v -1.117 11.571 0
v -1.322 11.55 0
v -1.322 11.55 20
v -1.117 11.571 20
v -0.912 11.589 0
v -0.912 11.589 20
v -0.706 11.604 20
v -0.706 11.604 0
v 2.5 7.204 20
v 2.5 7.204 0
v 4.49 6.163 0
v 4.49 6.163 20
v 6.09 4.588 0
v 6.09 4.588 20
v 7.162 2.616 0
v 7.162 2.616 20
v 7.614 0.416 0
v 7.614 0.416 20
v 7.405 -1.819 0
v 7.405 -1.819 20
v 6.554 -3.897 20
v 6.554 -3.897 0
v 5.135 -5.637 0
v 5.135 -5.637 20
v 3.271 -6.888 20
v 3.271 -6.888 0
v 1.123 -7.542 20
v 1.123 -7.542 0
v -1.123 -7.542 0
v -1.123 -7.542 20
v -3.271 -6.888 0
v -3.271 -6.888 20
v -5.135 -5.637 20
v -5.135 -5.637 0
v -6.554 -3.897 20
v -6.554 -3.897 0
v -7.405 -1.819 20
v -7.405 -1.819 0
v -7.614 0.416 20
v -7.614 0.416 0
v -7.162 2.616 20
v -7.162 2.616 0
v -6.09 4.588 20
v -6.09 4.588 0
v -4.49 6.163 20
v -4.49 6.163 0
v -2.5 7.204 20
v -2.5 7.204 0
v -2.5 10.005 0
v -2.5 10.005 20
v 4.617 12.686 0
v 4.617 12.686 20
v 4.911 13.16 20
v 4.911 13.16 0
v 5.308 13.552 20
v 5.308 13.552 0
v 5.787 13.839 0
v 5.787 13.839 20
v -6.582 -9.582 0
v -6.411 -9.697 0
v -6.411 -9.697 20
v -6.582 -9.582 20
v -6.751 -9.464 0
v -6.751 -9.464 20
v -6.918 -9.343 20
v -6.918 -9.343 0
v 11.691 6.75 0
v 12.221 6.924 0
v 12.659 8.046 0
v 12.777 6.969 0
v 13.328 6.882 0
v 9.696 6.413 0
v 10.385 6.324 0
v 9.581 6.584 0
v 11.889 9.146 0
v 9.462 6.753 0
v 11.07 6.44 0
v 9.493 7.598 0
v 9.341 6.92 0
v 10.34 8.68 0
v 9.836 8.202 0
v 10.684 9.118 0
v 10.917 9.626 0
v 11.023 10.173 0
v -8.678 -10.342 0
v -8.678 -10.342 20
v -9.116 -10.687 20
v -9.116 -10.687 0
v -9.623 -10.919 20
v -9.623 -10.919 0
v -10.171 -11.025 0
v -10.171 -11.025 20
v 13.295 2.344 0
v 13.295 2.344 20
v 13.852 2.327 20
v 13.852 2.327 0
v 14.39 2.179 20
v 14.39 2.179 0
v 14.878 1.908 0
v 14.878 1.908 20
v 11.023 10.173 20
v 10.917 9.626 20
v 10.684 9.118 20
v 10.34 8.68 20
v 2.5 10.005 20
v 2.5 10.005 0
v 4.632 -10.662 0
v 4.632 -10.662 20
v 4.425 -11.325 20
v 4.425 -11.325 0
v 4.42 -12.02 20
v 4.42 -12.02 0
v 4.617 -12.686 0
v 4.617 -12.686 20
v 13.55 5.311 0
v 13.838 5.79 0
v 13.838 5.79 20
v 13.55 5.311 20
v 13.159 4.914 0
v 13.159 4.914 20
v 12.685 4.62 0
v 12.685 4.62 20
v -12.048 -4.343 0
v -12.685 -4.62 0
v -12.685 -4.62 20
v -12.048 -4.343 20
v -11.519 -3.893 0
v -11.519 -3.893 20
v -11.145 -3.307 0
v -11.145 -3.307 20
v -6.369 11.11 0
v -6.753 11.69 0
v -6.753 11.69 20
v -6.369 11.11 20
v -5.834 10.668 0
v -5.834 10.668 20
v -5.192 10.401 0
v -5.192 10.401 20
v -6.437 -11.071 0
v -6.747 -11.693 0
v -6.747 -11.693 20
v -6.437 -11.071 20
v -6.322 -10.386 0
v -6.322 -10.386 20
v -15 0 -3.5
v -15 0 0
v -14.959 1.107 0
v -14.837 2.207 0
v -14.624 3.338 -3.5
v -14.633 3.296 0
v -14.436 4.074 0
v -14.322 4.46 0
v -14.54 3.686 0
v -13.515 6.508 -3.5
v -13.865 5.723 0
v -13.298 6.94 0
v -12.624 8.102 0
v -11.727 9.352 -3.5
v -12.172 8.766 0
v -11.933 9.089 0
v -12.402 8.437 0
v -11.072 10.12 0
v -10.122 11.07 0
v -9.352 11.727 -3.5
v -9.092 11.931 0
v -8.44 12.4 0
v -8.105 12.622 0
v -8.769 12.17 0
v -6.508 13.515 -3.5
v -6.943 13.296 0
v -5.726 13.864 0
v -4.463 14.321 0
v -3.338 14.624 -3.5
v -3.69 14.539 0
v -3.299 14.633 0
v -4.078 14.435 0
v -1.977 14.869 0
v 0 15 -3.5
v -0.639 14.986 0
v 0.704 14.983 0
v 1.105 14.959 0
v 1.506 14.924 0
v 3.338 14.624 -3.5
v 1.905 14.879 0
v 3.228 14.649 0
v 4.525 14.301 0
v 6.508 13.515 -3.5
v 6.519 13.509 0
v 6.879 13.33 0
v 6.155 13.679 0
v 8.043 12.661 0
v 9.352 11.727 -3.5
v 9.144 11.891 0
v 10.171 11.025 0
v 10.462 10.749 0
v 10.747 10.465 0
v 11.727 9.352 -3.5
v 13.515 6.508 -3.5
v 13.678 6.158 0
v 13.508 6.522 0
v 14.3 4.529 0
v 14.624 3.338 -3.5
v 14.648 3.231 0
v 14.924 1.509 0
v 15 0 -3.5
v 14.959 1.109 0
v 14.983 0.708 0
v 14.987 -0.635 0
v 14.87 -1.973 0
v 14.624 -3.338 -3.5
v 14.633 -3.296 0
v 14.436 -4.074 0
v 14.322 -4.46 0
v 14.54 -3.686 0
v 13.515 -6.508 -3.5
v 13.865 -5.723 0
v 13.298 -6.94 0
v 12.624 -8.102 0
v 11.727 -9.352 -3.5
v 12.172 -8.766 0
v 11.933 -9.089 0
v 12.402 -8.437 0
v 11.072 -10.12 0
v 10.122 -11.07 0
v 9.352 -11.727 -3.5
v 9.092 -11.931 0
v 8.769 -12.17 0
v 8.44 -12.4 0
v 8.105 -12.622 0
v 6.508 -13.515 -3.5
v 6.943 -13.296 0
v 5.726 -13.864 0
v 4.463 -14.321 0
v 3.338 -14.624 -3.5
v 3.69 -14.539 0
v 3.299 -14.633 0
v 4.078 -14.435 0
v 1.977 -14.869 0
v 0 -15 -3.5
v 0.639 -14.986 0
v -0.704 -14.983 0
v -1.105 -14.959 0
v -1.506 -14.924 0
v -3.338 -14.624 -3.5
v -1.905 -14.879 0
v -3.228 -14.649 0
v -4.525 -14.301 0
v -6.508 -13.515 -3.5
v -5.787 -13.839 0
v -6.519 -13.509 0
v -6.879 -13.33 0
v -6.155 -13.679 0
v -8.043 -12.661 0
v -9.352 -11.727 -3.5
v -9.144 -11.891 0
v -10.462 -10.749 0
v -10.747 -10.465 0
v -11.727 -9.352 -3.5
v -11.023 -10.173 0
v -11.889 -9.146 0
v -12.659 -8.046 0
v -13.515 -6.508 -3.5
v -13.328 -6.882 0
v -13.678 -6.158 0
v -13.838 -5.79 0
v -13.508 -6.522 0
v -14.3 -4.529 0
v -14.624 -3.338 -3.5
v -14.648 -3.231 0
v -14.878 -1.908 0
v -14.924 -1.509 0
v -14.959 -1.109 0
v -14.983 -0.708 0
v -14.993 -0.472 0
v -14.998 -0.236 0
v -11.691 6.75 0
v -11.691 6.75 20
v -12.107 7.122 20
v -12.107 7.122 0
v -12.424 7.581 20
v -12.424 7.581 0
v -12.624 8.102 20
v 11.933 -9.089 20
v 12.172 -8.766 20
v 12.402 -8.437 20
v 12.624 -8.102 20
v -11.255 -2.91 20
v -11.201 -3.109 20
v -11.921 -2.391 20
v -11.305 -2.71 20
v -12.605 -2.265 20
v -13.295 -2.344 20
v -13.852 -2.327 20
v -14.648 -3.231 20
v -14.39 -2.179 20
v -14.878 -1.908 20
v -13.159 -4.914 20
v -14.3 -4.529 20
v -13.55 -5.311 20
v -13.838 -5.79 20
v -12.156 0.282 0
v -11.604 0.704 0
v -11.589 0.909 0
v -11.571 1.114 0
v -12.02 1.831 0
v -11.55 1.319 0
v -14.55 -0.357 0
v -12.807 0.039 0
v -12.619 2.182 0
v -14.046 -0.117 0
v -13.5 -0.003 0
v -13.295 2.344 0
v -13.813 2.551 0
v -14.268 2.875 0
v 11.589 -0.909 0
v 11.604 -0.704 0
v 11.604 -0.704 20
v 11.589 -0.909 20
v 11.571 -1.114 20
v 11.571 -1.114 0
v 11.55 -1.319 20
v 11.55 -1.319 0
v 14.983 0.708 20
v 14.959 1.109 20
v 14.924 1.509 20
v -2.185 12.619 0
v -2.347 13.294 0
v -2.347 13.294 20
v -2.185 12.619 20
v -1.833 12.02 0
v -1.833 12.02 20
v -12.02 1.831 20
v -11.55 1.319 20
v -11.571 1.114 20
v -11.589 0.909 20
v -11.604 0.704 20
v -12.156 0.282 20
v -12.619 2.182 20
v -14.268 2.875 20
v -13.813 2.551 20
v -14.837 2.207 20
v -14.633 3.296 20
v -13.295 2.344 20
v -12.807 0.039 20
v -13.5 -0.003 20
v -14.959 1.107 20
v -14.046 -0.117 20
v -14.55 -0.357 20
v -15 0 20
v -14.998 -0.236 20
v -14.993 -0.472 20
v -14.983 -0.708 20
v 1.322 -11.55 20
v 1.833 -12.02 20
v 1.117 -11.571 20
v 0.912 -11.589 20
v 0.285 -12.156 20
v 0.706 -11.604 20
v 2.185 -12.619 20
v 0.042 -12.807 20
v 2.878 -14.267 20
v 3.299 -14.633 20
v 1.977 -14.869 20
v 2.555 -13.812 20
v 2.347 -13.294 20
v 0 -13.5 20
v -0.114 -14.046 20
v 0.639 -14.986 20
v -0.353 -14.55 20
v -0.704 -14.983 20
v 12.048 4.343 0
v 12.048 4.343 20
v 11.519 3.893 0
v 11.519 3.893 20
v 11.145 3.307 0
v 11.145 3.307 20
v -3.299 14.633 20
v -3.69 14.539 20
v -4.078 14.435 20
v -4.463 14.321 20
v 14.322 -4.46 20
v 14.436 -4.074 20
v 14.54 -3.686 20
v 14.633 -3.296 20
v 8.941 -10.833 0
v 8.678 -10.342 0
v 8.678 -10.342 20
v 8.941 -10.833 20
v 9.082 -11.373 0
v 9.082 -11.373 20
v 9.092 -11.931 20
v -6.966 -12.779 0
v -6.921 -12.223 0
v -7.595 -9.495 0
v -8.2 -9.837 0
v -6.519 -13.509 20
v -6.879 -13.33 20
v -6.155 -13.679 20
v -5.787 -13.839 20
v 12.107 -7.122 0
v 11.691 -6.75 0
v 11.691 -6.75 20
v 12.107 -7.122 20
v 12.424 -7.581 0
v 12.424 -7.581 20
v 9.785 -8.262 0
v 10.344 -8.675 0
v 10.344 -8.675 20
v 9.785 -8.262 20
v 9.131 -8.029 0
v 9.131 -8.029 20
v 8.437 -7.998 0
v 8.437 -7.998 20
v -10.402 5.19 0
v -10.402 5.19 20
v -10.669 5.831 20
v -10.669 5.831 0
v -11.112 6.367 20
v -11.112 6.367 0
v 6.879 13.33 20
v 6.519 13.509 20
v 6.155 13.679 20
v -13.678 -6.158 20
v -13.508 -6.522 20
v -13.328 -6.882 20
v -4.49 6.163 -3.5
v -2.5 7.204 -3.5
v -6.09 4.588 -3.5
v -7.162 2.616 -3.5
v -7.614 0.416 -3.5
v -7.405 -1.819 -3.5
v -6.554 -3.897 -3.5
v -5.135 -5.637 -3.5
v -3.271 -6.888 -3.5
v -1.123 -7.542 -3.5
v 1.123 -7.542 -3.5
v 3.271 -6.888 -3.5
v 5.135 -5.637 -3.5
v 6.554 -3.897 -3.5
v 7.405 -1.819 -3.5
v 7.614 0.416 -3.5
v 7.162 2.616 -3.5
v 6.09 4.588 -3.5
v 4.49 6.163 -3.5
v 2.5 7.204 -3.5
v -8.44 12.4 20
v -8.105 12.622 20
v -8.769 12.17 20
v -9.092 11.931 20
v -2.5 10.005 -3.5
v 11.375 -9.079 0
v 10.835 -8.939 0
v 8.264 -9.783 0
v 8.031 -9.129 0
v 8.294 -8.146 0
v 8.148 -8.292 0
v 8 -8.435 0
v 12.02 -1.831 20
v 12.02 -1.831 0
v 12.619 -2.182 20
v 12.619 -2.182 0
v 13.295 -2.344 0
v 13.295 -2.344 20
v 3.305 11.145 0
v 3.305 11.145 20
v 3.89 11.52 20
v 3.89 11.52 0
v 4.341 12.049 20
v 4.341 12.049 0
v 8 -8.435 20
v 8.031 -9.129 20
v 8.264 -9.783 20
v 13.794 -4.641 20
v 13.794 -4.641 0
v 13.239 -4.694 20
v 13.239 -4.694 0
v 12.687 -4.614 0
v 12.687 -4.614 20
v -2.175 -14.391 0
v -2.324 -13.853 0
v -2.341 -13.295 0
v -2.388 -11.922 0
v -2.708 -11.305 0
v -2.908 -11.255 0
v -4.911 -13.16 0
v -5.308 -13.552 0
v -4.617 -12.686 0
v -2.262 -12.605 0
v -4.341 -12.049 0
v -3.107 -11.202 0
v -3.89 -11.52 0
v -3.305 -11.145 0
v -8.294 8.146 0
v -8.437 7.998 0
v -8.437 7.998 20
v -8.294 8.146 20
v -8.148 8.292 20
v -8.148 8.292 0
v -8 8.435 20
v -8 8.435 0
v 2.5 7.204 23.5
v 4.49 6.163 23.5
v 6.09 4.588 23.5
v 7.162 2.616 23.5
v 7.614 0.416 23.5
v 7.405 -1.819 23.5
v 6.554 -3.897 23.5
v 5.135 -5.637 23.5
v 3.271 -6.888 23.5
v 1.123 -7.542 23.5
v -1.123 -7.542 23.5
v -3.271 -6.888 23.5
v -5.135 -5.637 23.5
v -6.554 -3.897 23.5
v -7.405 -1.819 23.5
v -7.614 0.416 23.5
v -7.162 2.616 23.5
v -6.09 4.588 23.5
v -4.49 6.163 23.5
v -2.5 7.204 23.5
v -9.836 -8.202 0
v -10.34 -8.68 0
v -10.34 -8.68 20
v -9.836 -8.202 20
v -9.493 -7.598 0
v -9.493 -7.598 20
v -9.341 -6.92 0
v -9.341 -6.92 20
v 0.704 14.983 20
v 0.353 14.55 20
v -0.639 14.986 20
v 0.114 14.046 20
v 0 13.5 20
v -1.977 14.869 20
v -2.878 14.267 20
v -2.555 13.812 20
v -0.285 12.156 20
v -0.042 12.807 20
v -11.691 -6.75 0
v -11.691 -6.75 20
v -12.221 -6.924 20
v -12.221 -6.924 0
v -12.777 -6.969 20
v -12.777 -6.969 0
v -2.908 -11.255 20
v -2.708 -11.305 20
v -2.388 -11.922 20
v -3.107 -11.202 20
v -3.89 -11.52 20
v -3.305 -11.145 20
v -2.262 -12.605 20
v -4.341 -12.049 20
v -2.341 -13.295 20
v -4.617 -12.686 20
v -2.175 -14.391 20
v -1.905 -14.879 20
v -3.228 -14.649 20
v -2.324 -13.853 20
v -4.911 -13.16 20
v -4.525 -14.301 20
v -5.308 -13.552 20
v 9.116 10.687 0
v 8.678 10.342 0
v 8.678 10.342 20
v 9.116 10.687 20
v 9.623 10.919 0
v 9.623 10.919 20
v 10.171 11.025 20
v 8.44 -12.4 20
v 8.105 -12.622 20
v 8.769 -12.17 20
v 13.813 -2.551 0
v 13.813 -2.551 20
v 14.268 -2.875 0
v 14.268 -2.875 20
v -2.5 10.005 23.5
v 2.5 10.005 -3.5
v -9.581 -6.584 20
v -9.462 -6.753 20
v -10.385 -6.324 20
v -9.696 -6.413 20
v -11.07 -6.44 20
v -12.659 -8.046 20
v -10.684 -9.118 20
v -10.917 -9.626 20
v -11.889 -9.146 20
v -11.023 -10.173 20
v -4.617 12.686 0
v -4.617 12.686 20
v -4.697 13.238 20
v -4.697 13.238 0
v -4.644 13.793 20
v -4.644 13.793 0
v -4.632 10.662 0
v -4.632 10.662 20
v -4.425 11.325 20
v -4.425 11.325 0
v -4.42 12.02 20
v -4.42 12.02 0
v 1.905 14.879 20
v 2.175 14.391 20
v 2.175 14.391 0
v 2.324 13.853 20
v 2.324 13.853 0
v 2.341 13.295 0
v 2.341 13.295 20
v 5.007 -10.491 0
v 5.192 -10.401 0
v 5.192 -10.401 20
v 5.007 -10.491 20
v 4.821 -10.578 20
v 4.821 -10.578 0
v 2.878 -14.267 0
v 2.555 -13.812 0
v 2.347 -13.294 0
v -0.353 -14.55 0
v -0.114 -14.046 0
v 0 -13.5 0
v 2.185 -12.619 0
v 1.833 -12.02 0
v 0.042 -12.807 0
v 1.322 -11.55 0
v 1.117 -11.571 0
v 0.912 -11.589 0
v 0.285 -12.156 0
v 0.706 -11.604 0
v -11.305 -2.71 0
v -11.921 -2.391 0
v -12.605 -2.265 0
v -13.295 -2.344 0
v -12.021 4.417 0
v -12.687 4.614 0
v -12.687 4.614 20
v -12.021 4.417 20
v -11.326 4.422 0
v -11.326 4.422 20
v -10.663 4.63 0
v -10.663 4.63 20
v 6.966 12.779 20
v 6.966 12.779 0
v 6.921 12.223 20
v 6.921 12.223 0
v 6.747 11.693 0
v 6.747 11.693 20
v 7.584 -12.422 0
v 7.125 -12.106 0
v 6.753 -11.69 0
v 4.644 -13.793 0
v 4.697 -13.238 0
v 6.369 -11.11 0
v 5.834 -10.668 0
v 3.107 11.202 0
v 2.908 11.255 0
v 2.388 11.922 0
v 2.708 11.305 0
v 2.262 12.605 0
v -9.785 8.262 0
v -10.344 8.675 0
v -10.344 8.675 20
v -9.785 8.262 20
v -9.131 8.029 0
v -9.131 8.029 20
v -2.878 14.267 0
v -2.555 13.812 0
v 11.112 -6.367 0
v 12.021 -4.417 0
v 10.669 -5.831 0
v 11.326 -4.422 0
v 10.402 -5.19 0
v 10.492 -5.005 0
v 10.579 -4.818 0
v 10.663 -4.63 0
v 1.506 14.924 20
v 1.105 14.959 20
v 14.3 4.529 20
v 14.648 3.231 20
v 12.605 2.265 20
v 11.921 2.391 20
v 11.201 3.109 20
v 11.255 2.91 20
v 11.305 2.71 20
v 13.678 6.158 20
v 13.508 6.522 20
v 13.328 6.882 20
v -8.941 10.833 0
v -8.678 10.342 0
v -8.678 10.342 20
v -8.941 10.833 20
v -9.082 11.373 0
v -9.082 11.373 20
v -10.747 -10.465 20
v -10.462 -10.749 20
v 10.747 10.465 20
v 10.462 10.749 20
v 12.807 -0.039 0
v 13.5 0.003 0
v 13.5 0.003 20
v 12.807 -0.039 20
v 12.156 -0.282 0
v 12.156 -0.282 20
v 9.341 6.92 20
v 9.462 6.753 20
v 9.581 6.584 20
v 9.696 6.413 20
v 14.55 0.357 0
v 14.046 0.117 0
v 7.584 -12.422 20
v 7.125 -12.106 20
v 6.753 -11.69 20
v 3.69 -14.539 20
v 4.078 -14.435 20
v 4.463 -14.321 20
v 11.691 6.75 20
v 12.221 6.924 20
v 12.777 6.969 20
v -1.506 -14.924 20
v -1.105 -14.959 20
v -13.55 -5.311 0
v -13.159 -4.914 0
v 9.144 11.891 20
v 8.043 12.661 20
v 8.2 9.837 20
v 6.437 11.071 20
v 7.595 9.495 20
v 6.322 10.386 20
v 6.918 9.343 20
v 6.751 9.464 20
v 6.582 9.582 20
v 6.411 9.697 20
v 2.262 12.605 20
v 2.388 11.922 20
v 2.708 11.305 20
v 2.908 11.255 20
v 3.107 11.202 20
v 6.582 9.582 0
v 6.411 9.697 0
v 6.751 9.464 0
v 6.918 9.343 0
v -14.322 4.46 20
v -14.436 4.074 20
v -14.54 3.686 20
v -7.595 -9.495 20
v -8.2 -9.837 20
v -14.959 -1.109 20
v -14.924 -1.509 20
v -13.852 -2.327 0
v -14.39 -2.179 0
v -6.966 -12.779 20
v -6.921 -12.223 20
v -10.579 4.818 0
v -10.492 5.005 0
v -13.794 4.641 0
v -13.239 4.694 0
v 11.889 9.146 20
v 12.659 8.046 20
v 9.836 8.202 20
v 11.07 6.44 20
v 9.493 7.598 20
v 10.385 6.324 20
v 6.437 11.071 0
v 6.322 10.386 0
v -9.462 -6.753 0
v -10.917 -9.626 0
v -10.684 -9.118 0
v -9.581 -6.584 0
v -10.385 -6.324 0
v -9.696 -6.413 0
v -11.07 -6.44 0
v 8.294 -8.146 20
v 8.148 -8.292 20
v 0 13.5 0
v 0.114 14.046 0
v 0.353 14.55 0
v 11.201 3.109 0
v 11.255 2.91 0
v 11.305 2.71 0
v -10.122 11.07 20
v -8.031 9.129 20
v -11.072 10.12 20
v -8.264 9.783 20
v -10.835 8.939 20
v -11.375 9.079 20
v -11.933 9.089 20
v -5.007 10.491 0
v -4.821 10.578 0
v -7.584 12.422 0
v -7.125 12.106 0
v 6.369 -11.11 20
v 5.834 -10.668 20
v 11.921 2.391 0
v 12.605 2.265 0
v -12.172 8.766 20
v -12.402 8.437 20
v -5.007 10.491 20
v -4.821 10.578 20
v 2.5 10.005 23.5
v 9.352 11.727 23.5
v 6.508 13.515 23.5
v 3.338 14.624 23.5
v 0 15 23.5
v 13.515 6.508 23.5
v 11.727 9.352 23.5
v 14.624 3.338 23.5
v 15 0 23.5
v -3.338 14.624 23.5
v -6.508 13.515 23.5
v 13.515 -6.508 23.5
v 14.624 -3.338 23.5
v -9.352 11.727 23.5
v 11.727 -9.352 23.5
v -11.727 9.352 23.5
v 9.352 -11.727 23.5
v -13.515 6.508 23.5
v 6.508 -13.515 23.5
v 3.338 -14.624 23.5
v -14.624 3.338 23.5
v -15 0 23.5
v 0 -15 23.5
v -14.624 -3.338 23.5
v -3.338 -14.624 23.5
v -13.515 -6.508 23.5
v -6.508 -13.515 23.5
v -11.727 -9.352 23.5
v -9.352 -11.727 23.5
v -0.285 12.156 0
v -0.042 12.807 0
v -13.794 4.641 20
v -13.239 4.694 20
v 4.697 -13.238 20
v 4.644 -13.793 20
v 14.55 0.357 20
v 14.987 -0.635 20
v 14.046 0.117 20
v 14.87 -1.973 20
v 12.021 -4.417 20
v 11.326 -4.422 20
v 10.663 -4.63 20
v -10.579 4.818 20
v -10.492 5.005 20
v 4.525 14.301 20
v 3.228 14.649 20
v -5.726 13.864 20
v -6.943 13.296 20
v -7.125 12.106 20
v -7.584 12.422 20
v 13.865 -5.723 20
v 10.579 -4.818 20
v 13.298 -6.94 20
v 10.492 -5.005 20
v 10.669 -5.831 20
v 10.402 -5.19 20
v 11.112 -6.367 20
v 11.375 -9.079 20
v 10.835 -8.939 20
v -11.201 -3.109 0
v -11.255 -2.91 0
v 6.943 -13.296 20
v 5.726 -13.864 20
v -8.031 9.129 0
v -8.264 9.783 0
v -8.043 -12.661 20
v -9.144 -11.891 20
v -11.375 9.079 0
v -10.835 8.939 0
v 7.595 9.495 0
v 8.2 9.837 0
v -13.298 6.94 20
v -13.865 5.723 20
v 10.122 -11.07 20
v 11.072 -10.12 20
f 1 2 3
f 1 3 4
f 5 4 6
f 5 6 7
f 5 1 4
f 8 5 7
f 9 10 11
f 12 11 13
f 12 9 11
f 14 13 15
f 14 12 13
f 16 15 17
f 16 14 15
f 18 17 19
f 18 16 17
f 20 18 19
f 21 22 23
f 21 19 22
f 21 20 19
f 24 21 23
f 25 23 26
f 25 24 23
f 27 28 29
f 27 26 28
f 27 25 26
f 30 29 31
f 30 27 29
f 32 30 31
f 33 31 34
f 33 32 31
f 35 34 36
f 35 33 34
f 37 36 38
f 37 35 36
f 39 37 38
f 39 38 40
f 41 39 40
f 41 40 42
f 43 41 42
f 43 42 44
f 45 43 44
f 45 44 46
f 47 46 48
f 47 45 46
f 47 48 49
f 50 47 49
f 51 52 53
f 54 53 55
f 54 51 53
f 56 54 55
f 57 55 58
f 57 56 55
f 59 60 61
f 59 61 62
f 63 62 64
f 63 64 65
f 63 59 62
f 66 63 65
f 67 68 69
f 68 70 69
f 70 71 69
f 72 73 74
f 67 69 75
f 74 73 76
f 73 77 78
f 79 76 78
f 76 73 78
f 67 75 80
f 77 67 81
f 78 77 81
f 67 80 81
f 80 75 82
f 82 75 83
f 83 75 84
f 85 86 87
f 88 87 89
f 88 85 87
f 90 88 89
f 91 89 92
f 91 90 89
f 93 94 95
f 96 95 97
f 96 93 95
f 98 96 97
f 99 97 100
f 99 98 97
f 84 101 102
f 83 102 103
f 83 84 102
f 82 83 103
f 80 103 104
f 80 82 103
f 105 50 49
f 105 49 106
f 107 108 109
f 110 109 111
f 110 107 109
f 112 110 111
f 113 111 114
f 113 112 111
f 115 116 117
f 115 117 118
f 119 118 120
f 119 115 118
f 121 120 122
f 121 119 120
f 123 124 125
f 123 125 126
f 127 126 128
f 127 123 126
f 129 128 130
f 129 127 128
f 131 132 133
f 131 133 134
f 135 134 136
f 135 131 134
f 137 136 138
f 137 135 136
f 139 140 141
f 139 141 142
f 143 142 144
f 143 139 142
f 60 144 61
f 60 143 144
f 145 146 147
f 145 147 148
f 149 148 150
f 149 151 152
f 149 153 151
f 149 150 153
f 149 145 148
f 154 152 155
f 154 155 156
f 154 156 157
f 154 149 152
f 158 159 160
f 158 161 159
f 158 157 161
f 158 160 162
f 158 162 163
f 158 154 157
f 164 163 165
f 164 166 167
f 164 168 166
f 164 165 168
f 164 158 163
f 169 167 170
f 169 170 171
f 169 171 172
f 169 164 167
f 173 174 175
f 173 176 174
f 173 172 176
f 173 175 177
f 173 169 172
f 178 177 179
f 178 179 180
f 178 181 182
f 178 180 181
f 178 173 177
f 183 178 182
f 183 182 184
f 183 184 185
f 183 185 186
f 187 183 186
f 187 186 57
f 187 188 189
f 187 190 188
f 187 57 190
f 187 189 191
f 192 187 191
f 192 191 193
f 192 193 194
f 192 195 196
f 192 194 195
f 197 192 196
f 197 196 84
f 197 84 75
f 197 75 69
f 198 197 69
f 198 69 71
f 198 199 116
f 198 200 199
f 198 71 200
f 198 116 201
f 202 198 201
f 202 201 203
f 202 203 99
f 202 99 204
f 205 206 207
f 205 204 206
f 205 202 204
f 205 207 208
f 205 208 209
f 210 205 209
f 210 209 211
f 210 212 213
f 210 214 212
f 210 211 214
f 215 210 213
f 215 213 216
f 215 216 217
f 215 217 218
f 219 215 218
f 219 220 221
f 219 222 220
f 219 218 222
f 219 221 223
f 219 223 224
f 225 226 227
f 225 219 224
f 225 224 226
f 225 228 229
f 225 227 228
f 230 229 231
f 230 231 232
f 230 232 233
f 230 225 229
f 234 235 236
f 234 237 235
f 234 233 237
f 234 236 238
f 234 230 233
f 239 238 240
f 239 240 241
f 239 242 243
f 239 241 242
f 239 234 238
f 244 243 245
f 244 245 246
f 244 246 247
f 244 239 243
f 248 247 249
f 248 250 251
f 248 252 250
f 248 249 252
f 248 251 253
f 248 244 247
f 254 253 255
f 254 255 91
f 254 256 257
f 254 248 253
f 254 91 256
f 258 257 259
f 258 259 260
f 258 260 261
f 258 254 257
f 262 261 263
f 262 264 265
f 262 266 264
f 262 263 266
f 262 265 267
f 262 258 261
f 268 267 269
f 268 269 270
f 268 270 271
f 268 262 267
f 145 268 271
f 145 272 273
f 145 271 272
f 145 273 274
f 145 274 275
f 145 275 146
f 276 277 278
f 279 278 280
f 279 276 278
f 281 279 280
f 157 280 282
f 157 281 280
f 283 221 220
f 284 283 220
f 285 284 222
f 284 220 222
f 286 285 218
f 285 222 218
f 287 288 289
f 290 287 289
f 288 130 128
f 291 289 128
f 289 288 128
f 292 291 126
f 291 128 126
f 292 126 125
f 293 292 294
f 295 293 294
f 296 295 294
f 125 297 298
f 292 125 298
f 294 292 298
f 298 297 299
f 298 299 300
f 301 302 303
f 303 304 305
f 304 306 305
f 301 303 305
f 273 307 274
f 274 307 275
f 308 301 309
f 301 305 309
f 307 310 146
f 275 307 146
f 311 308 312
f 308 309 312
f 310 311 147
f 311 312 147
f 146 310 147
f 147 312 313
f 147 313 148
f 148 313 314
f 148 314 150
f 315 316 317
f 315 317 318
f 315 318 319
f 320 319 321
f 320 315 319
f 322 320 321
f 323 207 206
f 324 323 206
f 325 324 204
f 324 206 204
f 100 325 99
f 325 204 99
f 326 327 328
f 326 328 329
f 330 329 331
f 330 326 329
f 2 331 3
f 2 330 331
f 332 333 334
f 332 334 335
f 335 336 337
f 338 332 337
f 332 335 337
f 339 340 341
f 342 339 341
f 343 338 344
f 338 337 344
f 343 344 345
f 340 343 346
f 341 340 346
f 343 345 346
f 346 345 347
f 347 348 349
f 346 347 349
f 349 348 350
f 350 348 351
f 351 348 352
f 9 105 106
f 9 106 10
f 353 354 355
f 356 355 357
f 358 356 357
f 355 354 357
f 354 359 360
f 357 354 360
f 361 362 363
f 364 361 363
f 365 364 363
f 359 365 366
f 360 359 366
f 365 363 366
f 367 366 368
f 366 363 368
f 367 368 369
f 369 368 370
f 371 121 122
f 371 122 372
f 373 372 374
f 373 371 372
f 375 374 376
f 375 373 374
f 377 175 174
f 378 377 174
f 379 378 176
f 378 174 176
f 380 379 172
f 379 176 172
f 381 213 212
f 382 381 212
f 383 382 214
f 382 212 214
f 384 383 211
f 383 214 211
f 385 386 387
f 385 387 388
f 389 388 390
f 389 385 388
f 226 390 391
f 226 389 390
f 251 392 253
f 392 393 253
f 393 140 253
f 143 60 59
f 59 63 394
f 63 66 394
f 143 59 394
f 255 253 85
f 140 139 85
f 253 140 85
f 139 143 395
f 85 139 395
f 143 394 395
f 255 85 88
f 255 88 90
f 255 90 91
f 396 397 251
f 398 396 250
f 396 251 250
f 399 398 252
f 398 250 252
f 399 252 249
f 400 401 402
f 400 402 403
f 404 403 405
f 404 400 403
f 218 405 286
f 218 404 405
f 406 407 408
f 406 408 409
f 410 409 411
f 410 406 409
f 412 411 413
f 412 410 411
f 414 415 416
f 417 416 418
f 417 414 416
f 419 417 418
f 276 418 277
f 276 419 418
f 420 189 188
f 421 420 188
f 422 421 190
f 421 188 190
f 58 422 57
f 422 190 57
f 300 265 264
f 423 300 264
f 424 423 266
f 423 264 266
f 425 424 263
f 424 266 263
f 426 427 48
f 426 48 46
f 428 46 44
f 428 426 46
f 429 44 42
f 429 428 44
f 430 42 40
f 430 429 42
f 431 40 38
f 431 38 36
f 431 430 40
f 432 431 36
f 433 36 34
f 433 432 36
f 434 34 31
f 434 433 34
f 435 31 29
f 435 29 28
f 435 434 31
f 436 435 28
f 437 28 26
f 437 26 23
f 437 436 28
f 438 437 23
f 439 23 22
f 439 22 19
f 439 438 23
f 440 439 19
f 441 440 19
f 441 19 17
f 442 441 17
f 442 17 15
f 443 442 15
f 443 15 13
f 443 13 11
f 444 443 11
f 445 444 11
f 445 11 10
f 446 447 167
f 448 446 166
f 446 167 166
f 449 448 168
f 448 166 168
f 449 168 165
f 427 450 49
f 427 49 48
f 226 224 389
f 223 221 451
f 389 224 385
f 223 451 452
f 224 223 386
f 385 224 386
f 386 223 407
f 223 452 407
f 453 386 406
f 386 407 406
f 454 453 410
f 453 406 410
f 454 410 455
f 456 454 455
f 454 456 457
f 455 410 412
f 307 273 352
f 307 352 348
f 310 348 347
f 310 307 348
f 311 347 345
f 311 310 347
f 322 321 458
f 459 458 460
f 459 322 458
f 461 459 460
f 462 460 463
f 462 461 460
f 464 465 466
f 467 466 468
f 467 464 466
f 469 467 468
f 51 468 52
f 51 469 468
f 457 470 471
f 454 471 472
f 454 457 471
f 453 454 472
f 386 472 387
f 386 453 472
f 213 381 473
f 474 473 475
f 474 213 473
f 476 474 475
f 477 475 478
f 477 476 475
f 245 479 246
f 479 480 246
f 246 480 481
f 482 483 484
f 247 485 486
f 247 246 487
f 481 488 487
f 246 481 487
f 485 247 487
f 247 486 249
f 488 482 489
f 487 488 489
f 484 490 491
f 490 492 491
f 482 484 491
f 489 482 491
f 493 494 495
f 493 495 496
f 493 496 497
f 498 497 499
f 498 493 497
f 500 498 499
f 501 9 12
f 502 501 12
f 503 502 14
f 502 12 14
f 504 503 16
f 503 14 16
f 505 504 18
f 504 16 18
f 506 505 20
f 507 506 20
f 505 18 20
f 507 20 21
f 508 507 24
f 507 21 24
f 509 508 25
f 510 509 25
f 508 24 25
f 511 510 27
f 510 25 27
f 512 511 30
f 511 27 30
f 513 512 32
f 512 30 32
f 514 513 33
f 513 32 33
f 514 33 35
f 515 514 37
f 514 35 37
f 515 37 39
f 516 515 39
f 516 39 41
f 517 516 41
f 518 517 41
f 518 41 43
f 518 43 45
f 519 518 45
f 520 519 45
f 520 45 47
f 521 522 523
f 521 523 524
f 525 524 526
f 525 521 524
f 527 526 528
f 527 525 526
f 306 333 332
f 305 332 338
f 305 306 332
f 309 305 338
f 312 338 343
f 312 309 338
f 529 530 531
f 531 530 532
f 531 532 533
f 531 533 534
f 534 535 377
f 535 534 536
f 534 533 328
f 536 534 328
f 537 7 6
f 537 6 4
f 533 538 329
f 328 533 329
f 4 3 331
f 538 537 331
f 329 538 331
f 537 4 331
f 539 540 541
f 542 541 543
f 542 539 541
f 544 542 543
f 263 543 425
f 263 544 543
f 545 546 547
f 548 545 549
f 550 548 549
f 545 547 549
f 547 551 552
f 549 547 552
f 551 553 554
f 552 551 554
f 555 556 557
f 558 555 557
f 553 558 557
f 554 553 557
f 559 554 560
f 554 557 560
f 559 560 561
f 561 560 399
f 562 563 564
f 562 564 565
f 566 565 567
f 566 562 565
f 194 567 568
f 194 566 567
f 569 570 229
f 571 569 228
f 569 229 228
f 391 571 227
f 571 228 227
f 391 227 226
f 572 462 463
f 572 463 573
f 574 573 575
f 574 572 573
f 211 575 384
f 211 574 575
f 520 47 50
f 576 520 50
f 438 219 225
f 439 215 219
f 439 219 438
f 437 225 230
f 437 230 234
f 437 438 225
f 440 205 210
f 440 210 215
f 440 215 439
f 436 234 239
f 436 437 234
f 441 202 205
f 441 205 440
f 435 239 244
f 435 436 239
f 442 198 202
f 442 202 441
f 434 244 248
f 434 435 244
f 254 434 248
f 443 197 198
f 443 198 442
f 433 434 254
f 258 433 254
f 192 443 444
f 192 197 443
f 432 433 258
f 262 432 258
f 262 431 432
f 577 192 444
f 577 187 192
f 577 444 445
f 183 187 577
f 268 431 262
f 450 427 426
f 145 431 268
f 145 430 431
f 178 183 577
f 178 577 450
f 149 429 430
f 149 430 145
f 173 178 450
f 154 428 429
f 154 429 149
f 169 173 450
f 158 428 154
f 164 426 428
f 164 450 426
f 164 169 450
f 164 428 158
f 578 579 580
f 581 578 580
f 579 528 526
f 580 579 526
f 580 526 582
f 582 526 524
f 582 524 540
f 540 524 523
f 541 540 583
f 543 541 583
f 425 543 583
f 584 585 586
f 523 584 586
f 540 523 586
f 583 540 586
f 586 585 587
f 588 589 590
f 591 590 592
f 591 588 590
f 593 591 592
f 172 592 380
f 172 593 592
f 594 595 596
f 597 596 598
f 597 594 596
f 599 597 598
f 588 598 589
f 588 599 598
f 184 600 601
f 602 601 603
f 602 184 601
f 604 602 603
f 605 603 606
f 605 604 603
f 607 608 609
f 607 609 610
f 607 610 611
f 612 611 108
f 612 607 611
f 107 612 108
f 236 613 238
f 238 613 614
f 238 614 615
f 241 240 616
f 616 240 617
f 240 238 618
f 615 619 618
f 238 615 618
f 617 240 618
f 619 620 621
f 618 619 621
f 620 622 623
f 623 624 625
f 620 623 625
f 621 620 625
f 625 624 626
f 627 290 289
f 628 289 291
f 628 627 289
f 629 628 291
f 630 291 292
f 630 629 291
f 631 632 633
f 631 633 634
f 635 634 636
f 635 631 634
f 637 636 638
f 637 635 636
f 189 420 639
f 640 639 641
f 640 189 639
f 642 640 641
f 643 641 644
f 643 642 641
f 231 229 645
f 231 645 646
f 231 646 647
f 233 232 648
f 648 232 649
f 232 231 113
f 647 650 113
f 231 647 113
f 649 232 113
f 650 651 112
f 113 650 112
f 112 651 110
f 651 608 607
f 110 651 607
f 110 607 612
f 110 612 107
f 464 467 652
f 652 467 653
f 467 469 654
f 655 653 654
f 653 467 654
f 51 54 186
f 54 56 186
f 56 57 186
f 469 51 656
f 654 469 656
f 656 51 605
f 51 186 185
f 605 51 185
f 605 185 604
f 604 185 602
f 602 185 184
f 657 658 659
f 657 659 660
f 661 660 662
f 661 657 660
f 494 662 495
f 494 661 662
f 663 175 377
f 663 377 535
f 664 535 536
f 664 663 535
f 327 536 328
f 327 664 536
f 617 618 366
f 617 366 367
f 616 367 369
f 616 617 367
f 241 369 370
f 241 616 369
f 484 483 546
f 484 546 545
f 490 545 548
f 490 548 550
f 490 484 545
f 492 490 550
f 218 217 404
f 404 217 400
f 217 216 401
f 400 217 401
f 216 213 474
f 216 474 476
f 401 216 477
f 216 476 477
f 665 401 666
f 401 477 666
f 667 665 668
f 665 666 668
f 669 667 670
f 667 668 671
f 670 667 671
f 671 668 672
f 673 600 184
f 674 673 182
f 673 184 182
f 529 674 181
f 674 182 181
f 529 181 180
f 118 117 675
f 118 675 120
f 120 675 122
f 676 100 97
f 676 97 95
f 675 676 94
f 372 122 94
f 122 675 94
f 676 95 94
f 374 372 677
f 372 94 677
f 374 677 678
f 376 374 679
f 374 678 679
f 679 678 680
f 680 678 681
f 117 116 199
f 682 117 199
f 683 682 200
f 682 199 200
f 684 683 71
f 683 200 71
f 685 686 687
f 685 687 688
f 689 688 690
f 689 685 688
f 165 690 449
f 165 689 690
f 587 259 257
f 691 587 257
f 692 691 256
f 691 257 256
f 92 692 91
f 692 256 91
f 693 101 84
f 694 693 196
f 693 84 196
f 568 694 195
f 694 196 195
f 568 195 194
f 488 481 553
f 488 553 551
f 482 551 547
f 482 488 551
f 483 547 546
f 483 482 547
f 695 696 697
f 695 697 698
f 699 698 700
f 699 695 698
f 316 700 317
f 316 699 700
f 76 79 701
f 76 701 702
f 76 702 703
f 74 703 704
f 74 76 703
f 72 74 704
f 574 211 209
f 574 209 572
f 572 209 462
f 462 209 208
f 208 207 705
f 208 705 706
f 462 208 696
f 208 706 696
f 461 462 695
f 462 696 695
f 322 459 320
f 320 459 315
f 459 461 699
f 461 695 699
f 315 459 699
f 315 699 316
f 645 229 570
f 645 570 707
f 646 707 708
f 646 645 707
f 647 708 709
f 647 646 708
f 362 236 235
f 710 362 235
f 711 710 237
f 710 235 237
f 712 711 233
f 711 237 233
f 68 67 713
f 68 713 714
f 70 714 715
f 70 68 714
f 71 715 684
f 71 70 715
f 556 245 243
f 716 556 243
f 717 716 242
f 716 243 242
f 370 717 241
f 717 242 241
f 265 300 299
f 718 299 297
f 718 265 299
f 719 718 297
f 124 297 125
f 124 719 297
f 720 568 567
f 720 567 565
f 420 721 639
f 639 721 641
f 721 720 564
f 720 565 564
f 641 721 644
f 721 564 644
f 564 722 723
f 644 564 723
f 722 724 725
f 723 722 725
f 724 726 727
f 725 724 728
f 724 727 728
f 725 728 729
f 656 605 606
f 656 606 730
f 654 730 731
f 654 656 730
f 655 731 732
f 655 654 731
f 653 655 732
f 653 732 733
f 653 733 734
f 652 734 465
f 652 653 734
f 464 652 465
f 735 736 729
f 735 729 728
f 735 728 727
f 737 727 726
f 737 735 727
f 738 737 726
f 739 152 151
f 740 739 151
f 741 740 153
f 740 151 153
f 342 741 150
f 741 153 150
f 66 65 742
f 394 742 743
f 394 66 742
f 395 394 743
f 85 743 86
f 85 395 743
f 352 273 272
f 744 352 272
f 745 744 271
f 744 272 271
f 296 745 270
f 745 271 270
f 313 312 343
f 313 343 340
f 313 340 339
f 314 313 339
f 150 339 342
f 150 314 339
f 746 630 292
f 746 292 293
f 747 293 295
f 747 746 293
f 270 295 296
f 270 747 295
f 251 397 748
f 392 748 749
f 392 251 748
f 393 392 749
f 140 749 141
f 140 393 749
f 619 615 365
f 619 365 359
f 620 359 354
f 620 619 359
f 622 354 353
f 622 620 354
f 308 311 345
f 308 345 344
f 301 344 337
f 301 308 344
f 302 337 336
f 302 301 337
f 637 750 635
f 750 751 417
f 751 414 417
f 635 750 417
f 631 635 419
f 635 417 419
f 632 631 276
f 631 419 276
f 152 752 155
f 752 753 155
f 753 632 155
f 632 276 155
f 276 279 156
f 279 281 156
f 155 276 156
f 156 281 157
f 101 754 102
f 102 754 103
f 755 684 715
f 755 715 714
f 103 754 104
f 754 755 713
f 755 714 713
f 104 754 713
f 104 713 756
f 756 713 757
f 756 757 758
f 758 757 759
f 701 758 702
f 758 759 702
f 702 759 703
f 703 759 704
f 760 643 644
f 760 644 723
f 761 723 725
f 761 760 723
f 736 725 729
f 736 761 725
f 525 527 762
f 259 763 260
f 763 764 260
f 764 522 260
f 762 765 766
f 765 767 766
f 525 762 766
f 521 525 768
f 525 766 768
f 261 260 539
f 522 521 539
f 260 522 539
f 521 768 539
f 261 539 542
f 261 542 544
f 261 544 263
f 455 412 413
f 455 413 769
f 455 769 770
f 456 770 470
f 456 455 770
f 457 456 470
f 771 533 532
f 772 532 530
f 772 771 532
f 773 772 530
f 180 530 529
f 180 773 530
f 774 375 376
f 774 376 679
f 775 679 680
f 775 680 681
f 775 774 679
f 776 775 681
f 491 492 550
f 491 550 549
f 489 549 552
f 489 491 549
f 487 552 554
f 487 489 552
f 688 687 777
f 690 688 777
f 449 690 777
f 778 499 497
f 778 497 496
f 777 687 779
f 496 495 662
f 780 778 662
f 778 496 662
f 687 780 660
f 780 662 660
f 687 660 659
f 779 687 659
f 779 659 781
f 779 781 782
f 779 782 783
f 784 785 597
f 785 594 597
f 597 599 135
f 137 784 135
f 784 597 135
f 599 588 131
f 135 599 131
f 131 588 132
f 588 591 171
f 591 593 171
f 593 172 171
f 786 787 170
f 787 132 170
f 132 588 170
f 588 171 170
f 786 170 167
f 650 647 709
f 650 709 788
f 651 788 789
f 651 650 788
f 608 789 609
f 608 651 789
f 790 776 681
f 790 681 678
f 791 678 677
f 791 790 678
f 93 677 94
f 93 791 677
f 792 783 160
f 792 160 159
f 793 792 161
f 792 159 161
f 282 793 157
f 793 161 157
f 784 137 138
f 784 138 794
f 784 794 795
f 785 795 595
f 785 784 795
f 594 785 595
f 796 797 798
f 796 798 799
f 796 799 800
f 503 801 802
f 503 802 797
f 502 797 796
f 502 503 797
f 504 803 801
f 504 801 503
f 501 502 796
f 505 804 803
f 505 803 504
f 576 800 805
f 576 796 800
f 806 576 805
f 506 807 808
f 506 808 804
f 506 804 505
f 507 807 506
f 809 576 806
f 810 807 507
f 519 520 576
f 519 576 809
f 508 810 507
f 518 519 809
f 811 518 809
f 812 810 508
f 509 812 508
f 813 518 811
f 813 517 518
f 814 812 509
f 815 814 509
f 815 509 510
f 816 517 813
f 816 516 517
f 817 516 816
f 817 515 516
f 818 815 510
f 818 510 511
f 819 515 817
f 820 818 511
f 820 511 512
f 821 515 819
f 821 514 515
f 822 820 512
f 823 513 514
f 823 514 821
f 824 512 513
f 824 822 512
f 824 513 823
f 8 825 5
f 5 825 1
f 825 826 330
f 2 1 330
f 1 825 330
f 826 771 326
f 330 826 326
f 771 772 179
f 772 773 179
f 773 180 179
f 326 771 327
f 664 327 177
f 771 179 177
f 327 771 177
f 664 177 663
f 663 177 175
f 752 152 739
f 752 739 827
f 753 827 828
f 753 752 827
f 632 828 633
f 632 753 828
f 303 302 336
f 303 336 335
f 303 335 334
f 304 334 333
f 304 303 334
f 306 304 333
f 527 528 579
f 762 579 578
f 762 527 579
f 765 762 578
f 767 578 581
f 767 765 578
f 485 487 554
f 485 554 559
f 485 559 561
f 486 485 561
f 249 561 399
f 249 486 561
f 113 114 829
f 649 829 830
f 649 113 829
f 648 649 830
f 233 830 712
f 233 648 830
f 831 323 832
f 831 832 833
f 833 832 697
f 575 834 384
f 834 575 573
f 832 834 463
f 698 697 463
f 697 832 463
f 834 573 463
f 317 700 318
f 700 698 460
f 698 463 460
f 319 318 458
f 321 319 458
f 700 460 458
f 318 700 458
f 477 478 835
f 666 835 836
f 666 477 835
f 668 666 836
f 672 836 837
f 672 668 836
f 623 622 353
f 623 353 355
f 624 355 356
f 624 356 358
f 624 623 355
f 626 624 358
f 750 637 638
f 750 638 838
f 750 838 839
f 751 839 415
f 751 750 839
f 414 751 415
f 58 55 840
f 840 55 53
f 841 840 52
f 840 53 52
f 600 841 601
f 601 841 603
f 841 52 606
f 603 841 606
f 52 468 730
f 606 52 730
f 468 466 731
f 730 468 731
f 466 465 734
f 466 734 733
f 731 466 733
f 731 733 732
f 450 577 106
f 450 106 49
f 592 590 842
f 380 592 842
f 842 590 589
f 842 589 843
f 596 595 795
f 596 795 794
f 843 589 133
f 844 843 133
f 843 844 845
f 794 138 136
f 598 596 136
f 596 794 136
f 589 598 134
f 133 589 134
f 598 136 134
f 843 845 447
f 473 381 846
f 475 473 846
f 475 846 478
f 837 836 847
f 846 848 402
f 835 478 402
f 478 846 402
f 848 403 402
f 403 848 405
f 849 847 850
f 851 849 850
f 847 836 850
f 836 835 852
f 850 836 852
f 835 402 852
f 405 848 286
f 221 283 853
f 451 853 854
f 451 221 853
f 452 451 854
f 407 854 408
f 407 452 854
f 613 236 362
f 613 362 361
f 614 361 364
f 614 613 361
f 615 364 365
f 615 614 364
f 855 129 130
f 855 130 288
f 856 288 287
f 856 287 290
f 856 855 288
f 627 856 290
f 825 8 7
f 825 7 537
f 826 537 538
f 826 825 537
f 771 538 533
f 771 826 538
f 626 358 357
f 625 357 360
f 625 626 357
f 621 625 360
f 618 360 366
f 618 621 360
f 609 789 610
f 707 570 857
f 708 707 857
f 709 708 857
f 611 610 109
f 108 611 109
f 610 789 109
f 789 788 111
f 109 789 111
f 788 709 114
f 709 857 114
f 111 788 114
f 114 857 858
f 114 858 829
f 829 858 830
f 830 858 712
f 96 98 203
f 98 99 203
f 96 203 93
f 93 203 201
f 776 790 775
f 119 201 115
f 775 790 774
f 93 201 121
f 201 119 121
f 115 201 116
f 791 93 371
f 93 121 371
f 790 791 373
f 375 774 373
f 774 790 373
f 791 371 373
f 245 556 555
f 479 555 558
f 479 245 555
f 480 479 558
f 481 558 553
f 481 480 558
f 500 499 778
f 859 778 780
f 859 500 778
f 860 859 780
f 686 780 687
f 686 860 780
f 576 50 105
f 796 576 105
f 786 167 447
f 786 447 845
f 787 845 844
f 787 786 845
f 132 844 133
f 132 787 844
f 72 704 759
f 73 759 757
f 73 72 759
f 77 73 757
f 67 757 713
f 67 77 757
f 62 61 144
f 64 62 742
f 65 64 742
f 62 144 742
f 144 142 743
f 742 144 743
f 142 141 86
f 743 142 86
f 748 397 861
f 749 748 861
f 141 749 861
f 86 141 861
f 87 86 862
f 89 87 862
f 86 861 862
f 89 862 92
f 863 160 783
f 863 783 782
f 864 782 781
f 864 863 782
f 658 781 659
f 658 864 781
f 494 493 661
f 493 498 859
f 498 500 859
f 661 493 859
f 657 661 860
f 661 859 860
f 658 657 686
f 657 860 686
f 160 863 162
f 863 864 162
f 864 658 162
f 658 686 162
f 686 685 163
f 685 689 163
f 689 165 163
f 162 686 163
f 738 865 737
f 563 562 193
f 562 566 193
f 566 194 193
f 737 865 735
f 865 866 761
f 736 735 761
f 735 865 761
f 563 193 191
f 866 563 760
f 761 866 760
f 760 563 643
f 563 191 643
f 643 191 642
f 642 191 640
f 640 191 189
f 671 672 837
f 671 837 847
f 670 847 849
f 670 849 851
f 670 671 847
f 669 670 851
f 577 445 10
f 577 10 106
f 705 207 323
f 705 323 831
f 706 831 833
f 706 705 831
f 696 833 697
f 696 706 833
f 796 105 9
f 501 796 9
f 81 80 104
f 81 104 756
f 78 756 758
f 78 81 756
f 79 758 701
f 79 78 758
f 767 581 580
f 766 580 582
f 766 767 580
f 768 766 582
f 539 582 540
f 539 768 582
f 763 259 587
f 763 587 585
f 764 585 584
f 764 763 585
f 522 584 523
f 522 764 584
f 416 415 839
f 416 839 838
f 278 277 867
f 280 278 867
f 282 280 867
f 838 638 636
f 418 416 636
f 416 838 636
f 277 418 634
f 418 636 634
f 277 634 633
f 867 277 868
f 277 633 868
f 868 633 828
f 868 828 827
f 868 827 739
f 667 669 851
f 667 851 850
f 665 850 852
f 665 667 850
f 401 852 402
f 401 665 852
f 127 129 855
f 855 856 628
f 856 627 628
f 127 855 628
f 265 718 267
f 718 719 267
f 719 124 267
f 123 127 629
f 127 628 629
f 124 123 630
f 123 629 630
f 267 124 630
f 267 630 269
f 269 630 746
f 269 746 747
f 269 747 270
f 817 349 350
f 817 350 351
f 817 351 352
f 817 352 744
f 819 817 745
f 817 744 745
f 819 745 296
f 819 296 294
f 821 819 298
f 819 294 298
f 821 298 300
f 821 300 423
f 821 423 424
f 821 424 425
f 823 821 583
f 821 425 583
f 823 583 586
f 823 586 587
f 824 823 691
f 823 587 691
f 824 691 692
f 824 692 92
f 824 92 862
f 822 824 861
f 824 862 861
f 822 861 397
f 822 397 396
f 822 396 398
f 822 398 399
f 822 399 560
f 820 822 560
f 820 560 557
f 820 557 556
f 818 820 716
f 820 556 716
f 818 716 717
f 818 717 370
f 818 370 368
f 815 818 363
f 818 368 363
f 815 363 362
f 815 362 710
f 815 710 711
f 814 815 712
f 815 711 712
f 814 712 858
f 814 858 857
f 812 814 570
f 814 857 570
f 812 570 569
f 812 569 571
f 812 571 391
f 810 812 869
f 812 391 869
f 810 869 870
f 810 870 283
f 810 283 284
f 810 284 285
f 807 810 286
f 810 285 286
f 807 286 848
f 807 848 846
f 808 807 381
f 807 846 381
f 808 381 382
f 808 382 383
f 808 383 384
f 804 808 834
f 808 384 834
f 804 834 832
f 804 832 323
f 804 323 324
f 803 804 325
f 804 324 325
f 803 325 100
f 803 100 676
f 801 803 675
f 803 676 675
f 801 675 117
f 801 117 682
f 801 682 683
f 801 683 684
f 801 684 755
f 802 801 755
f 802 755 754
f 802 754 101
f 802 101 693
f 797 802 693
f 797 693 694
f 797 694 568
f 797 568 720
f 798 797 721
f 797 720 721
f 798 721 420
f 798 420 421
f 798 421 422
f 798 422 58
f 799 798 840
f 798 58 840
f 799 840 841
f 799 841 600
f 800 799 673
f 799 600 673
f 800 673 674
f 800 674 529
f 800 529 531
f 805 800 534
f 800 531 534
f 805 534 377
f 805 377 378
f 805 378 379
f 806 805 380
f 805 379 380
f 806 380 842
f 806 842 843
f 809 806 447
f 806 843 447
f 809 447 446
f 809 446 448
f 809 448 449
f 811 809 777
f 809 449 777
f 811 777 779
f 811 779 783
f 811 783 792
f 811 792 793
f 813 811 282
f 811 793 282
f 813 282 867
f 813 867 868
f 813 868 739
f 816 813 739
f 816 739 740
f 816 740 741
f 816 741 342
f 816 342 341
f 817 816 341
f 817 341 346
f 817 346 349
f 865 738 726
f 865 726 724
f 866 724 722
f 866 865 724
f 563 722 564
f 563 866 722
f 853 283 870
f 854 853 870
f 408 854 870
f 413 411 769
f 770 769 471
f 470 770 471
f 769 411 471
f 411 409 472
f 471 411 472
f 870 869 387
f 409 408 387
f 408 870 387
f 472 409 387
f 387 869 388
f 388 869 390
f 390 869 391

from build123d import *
from build123d.topology import SkipClean

# Parameters (mm, degrees)
CROQUIS1_R              = 15
SALIENTE_EXTRUIR1_DEPTH = 20
CORTAR_EXTRUIR1_START   = -50
CORTAR_EXTRUIR1_DEPTH   = 50
MATRIZC1_COUNT          = 18
CORTAR_EXTRUIR2_DEPTH   = 50
SALIENTE_EXTRUIR2_START = 3.5
CROQUIS4_R              = 15
SALIENTE_EXTRUIR2_DEPTH = 3.5
CROQUIS5_R              = 15
SALIENTE_EXTRUIR3_DEPTH = 3.5


with BuildPart() as part:
    # Croquis1 → Saliente-Extruir1 (new body)
    with BuildSketch(Plane.XY):
        Circle(CROQUIS1_R)
    extrude(amount=SALIENTE_EXTRUIR1_DEPTH)

    # Croquis2 → Cortar-Extruir1 (cut)
    with BuildSketch(Plane.XY.offset(20).offset(CORTAR_EXTRUIR1_START)):
        with BuildLine():
            ThreePointArc((0.706271711, -11.603525553), (0.13915994, -12.472075367), (0, -13.5))
            ThreePointArc((0, -13.5), (-0.21879275, -14.305081992), (-0.704430424, -14.983450129))
            ThreePointArc((-0.704430424, -14.983450129), (1.309, -14.942774809), (3.298836097, -14.632760519))
            ThreePointArc((3.298836097, -14.632760519), (2.702648979, -14.049161169), (2.347211067, -13.29438228))
            ThreePointArc((2.347211067, -13.29438228), (2.031447992, -12.306309297), (1.321961295, -11.549590613))
            ThreePointArc((1.321961295, -11.549590613), (1.014475, -11.580650477), (0.706271711, -11.603525553))
        make_face()
    cortar_extruir1 = extrude(amount=CORTAR_EXTRUIR1_DEPTH, mode=Mode.SUBTRACT)

    # MatrizC1: Cortar-Extruir1 ×18 about axis
    matrizc1_axis = Axis((0, 0, 20), (0, 0, 1))
    for i in range(1, MATRIZC1_COUNT):
        add(cortar_extruir1.rotate(matrizc1_axis, i * 360 / MATRIZC1_COUNT), mode=Mode.SUBTRACT)

    # Croquis3 → Cortar-Extruir2 (cut)
    with BuildSketch(Plane.XY.offset(20)):
        with BuildLine():
            Line((-2.5, 7.203514767), (-2.5, 10.005475737))
            Line((-2.5, 10.005475737), (2.5, 10.005475737))
            Line((2.5, 10.005475737), (2.5, 7.203514767))
            ThreePointArc((2.5, 7.203514767), (0, -7.625), (-2.5, 7.203514767))
        make_face()
    extrude(amount=-CORTAR_EXTRUIR2_DEPTH, mode=Mode.SUBTRACT)

    # Croquis4 → Saliente-Extruir2 (add)
    with SkipClean():  # the faces are left unmerged after this step: merging them gives an invalid solid
        with BuildSketch(Plane(origin=(0, 0, 0), x_dir=(-1, 0, 0), z_dir=(0, 0, -1)).offset(SALIENTE_EXTRUIR2_START)):
            Circle(CROQUIS4_R)
            with BuildLine():
                Line((2.5, 10.005475737), (2.5, 7.203514767))
                ThreePointArc((2.5, 7.203514767), (0, -7.625), (-2.5, 7.203514767))
                Line((-2.5, 7.203514767), (-2.5, 10.005475737))
                Line((-2.5, 10.005475737), (2.5, 10.005475737))
            make_face(mode=Mode.SUBTRACT)
        extrude(amount=-SALIENTE_EXTRUIR2_DEPTH)

    # Croquis5 → Saliente-Extruir3 (add)
    with BuildSketch(Plane.XY.offset(20)):
        Circle(CROQUIS5_R)
        with BuildLine():
            Line((2.5, 10.005475737), (2.5, 7.203514767))
            ThreePointArc((2.5, 7.203514767), (0, -7.625), (-2.5, 7.203514767))
            Line((-2.5, 7.203514767), (-2.5, 10.005475737))
            Line((-2.5, 10.005475737), (2.5, 10.005475737))
        make_face(mode=Mode.SUBTRACT)
    extrude(amount=SALIENTE_EXTRUIR3_DEPTH)


solid = part.part
